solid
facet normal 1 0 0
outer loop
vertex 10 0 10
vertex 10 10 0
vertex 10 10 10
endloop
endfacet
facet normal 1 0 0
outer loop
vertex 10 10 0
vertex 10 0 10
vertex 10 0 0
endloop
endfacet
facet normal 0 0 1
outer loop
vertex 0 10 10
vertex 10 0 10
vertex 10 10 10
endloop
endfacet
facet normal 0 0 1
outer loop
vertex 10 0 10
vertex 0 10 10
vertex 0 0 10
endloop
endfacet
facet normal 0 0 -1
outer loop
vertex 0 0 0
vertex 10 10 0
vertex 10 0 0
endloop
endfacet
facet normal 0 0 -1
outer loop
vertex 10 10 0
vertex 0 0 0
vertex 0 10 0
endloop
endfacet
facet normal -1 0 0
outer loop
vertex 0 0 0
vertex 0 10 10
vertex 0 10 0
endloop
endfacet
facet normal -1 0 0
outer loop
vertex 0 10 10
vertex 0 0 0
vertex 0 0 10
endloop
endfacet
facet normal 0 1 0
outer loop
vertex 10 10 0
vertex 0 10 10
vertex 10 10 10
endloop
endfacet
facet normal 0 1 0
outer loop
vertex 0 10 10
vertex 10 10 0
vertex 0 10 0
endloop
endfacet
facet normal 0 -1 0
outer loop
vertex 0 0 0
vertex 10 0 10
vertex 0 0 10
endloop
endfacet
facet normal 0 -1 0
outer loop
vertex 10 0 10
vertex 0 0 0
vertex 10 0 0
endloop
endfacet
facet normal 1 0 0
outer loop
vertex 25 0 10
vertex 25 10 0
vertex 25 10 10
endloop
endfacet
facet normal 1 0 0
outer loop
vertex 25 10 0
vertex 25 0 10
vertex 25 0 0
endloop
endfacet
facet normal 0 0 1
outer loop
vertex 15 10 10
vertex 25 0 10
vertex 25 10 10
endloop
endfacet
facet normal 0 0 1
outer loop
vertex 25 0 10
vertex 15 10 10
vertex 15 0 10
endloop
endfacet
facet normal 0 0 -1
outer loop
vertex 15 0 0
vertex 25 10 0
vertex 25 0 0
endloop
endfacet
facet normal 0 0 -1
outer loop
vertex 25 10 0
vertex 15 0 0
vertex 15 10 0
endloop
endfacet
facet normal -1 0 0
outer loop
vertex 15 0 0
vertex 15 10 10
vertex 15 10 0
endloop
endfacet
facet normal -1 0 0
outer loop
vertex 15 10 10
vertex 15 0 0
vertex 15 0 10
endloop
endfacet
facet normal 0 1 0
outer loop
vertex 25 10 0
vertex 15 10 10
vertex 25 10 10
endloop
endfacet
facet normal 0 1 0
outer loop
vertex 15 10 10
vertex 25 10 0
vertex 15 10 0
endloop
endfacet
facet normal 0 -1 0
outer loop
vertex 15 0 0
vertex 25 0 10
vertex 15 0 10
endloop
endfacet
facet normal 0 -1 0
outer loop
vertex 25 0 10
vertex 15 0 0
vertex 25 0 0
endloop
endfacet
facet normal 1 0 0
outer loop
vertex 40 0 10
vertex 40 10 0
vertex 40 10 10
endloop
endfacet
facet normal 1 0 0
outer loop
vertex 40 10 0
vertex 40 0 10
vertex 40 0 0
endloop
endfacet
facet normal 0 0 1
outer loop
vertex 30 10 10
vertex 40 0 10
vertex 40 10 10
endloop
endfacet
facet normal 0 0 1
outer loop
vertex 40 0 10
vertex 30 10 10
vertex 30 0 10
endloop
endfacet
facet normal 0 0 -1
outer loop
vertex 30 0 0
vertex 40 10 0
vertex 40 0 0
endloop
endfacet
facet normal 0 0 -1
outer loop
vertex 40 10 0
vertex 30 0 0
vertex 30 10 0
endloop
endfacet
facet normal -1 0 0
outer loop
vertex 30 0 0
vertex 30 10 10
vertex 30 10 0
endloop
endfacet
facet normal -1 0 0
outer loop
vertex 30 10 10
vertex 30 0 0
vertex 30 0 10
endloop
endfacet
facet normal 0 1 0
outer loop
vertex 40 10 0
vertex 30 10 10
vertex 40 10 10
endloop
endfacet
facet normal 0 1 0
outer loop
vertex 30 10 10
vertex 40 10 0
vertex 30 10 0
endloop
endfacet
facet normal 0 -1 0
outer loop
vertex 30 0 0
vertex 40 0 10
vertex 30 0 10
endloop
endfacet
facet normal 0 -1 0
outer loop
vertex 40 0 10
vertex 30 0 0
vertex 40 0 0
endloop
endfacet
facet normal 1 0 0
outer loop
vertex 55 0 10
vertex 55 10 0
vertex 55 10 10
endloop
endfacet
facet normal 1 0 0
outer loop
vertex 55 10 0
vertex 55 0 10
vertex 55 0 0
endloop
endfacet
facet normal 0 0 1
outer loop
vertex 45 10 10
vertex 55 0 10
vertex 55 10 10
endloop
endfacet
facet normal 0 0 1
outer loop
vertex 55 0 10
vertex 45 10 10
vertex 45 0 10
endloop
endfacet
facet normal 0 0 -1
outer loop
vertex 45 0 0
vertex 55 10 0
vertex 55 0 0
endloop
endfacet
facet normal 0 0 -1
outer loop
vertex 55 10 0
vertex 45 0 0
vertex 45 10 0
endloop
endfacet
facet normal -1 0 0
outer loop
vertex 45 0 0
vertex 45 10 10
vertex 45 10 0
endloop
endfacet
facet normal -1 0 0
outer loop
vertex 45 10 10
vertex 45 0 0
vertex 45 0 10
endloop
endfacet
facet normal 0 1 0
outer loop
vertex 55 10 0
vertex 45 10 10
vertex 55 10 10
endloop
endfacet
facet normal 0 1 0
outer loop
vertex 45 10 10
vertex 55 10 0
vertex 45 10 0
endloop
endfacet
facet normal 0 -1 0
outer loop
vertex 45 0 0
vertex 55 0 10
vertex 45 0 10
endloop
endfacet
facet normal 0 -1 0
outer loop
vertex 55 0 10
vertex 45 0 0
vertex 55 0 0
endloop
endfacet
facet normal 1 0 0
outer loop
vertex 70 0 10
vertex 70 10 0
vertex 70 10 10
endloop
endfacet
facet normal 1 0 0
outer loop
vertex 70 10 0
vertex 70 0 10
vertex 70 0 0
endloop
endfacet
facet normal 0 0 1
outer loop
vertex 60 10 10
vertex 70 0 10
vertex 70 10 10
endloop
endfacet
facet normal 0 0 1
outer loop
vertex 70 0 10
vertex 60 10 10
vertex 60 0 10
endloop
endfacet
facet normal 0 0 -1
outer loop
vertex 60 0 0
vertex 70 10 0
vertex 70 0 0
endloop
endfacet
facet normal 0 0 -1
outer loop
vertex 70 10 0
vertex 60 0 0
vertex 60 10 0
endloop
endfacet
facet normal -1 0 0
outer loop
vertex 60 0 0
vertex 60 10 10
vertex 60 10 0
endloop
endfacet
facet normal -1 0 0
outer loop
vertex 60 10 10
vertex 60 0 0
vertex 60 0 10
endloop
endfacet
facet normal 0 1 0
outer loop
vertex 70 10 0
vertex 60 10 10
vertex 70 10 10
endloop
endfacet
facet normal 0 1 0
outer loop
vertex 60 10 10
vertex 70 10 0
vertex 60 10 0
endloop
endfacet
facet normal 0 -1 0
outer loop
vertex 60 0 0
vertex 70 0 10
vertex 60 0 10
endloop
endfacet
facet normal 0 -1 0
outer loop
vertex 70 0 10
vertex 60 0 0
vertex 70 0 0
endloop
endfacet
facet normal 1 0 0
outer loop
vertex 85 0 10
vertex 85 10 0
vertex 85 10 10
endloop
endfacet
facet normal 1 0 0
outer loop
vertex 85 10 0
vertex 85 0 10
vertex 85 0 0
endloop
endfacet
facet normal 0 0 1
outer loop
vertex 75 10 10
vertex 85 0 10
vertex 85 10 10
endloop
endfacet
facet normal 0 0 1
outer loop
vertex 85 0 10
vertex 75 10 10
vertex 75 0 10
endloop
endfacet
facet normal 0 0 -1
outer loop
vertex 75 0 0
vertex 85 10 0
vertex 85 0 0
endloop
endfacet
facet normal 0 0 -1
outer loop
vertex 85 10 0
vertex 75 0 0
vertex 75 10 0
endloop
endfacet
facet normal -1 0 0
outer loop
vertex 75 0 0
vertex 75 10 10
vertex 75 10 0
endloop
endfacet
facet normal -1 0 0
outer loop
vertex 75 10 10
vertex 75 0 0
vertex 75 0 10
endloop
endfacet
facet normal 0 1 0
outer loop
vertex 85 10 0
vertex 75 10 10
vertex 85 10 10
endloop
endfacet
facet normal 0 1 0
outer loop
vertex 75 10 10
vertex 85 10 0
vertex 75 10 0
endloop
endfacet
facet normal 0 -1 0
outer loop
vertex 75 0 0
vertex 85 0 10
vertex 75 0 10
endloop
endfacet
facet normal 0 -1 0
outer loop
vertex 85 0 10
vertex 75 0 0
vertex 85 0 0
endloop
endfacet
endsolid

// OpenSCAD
// Erstellung einer Reihe von Würfeln mit einer Schleife
for (i = [0 : 5]) {
    translate([i * 15, 0, 0]) // Verschiebung jedes Würfels entlang der X-Achse
        cube(10);
}
// Dieser Code erzeugt eine lineare Anordnung von 6 Würfeln
